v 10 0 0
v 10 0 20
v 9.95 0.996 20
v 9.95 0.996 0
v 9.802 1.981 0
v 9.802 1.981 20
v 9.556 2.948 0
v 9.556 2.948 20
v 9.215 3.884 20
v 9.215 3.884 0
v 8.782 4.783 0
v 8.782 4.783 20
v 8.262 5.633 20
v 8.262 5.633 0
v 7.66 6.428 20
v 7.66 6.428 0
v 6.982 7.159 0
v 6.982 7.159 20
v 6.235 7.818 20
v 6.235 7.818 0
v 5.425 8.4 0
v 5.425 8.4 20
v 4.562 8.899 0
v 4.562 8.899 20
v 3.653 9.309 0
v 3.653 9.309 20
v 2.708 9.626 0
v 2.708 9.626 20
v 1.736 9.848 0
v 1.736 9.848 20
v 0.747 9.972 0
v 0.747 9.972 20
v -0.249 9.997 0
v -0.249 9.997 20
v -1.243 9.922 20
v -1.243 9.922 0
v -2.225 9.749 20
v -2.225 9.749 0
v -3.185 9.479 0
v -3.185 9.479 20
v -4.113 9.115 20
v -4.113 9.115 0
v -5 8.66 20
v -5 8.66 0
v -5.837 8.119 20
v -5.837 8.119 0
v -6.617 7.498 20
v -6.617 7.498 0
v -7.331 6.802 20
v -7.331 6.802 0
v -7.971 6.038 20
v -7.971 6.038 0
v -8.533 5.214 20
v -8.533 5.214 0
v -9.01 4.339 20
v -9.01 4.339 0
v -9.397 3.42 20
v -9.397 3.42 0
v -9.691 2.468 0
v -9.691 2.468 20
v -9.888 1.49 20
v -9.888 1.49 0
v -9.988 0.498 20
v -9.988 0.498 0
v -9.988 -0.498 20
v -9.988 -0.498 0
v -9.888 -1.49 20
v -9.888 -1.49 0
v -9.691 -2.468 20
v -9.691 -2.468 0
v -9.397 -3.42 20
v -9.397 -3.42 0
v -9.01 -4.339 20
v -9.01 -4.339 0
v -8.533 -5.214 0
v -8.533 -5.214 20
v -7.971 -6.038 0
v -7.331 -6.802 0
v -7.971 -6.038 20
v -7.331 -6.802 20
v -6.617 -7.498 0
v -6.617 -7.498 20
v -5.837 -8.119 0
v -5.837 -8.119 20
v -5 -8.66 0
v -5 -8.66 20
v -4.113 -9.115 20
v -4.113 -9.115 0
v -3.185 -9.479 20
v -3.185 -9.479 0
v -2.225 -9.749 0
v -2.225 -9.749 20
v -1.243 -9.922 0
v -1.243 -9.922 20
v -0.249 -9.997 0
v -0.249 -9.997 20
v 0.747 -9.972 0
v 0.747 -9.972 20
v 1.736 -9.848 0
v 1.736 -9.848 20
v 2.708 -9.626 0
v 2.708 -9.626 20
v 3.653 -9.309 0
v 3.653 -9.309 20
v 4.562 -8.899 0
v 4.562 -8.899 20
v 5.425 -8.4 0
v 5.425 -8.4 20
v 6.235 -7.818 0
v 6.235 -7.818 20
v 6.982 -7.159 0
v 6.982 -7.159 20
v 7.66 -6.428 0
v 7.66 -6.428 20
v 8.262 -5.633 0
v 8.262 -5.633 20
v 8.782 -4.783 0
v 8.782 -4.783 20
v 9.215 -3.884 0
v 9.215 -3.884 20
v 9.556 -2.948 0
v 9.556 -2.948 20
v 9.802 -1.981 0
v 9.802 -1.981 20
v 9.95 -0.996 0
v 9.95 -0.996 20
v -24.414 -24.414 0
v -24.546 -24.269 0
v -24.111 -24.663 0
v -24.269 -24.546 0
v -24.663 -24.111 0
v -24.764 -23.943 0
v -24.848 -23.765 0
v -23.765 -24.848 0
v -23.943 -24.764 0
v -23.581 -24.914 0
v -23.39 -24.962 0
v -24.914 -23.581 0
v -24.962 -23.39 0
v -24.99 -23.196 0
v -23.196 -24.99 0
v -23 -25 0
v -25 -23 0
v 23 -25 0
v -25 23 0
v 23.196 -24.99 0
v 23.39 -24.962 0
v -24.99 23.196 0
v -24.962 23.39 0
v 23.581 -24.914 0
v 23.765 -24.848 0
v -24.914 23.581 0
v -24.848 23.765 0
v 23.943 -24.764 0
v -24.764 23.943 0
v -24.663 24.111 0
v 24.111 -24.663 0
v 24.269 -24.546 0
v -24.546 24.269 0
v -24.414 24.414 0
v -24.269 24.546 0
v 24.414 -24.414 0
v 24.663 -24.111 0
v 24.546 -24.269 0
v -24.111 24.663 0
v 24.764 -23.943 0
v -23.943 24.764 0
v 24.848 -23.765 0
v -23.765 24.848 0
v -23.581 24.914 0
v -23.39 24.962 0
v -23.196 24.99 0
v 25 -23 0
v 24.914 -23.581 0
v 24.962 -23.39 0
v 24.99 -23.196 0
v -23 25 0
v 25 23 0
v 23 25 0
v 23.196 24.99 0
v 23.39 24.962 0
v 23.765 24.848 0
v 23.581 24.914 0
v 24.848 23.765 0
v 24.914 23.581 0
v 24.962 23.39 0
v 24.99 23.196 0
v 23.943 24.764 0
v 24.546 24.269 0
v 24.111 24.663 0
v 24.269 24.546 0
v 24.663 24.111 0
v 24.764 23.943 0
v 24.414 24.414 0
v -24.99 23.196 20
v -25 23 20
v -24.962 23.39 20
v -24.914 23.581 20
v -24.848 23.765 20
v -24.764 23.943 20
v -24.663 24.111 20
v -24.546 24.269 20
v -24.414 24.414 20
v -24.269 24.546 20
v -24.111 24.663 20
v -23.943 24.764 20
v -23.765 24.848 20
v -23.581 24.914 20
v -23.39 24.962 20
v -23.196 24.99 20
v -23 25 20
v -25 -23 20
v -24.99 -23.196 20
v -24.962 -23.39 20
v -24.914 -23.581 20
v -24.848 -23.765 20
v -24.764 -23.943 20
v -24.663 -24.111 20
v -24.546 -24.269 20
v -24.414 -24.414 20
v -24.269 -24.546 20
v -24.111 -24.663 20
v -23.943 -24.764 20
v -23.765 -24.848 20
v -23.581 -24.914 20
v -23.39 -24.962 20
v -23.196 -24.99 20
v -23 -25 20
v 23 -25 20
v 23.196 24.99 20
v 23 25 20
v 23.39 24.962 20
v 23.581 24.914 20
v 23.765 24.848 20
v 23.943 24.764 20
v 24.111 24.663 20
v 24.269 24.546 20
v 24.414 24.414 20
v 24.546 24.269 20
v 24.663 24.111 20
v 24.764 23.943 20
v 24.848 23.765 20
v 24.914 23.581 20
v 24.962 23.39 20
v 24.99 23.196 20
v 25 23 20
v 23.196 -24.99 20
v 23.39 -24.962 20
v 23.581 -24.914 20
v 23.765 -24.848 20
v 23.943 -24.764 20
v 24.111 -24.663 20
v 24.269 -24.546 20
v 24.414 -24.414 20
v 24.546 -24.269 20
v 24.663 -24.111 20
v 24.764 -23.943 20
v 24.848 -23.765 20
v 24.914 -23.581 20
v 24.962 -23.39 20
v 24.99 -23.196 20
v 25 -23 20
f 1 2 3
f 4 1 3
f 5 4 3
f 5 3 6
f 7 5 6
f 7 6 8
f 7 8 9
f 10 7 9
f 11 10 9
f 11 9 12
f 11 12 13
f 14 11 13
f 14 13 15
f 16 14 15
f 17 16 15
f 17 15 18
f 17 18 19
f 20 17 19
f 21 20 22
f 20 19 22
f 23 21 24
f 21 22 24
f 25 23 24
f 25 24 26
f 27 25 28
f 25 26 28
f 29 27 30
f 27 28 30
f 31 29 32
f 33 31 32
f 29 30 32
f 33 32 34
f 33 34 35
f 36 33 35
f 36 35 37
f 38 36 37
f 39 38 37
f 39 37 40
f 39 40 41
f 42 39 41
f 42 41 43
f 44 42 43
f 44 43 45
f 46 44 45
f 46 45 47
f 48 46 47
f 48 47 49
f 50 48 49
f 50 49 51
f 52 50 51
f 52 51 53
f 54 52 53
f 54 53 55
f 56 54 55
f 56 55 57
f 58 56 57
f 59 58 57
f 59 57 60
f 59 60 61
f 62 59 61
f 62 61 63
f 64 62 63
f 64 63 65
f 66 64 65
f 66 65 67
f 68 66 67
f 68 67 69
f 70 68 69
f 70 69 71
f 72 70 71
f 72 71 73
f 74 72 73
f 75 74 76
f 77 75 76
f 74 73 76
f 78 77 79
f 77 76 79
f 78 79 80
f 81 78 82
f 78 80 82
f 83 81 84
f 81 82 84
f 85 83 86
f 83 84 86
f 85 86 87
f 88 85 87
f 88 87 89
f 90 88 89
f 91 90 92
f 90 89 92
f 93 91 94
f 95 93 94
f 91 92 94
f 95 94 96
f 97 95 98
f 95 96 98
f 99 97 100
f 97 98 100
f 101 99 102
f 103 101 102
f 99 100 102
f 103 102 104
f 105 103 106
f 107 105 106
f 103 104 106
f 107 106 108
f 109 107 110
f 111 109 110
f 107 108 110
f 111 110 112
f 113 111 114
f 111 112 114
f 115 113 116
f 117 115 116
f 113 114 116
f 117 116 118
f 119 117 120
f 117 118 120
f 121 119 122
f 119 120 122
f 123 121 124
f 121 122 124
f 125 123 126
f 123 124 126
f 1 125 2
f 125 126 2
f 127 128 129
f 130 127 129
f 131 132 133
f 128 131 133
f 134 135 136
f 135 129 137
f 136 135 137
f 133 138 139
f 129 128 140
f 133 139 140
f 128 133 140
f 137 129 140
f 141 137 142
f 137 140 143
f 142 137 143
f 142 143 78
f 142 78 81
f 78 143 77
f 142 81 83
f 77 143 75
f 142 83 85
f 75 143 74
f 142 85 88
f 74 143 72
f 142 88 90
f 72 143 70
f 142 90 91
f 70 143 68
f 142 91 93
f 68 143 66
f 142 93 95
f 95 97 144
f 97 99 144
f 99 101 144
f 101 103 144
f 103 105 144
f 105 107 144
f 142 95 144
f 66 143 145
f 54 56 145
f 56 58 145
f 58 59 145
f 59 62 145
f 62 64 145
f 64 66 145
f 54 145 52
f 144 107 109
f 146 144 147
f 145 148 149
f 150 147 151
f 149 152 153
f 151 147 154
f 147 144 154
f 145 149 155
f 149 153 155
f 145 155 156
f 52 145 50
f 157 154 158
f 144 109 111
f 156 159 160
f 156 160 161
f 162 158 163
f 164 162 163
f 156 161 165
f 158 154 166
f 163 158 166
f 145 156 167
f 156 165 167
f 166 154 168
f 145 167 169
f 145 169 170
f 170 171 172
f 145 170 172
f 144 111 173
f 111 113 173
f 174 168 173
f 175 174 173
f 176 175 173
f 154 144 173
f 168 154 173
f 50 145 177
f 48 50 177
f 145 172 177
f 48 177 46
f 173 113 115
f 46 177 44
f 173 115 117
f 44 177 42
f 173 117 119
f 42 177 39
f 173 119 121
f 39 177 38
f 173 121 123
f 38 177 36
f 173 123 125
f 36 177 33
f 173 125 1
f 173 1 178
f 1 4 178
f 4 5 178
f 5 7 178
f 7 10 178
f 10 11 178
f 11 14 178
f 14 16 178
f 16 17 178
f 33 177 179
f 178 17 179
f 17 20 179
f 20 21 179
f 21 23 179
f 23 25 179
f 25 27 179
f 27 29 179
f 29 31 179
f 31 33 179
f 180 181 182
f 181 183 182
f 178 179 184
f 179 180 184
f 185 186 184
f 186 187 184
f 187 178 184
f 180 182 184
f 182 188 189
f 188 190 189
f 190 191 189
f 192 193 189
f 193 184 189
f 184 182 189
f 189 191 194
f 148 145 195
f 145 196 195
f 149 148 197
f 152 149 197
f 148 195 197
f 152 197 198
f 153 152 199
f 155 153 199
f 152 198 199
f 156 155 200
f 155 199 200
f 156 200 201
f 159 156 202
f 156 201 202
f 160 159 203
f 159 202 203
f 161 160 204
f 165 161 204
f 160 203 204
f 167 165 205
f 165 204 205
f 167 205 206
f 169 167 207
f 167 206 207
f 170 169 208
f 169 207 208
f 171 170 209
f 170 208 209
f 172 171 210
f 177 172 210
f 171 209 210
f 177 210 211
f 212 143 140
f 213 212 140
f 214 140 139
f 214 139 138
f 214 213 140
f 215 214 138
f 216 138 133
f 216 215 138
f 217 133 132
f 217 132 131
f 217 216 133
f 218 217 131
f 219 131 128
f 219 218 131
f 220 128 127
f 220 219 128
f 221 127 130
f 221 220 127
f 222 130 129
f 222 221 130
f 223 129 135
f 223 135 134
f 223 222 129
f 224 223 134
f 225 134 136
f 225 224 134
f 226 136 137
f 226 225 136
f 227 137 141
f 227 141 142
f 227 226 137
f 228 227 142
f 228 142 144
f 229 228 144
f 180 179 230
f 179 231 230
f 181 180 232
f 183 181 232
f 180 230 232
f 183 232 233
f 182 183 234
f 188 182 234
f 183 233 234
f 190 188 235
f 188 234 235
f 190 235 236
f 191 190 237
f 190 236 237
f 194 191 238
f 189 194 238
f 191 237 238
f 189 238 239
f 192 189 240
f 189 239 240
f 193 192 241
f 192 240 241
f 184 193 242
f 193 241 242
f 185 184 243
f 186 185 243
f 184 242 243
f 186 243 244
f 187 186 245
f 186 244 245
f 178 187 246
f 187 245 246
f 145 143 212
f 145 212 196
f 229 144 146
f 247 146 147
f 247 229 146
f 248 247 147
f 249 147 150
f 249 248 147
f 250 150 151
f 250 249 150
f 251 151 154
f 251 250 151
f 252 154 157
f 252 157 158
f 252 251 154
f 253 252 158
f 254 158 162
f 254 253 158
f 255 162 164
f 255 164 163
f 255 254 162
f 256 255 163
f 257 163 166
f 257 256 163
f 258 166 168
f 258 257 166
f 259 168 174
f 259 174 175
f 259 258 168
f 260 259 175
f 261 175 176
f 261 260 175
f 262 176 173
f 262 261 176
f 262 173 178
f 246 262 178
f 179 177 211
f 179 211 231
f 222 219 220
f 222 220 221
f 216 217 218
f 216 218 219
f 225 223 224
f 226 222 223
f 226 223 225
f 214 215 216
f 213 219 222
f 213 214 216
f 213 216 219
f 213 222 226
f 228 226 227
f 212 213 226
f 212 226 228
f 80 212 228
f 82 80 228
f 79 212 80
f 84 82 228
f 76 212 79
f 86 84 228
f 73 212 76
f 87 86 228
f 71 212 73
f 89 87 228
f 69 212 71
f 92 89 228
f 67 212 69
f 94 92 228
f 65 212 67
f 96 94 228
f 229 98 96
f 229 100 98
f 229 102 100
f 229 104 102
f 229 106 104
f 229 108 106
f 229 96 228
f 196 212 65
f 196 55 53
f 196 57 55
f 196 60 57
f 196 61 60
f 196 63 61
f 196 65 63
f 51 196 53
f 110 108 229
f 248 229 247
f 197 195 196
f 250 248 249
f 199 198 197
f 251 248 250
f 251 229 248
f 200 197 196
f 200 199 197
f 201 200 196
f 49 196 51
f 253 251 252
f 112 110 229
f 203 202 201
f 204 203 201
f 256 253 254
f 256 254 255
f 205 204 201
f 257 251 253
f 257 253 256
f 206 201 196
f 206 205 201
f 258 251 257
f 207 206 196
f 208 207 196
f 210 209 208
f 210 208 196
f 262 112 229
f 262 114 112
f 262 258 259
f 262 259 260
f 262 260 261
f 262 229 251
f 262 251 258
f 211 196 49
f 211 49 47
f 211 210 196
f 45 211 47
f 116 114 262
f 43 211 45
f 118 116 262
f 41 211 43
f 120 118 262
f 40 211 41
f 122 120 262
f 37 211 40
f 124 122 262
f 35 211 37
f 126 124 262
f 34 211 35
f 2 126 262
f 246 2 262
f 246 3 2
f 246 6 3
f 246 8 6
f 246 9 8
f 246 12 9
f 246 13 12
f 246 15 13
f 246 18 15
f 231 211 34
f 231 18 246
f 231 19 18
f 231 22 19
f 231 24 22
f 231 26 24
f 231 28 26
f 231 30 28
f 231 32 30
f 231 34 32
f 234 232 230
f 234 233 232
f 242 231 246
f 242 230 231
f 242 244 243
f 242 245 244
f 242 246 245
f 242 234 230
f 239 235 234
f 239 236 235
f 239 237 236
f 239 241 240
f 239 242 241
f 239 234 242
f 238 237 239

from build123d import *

# Parameters (mm, degrees)
F0_W     = 50
F0_H     = 50
F1_DEPTH = 20
F2_R     = 10
F3_DEPTH = 20.001
F4_R     = 2


with BuildPart() as f1:
    # F0 (on Top) → F1 (new body)
    with BuildSketch(Plane.XY):
        Rectangle(F0_W, F0_H)
    extrude(amount=F1_DEPTH)

    # F2 (on face) → F3 (cut, through all)
    with BuildSketch(Plane.XY.offset(20)):
        Circle(F2_R)
    extrude(amount=-F3_DEPTH, mode=Mode.SUBTRACT)

    # F4
    f4_edges = [f1.edges().sort_by_distance(p)[0] for p in [
        (-25, -25, 10),
        (25, -25, 10),
        (-25, 25, 10),
        (25, 25, 10),
    ]]
    fillet(f4_edges, radius=F4_R)


solid = f1.part
